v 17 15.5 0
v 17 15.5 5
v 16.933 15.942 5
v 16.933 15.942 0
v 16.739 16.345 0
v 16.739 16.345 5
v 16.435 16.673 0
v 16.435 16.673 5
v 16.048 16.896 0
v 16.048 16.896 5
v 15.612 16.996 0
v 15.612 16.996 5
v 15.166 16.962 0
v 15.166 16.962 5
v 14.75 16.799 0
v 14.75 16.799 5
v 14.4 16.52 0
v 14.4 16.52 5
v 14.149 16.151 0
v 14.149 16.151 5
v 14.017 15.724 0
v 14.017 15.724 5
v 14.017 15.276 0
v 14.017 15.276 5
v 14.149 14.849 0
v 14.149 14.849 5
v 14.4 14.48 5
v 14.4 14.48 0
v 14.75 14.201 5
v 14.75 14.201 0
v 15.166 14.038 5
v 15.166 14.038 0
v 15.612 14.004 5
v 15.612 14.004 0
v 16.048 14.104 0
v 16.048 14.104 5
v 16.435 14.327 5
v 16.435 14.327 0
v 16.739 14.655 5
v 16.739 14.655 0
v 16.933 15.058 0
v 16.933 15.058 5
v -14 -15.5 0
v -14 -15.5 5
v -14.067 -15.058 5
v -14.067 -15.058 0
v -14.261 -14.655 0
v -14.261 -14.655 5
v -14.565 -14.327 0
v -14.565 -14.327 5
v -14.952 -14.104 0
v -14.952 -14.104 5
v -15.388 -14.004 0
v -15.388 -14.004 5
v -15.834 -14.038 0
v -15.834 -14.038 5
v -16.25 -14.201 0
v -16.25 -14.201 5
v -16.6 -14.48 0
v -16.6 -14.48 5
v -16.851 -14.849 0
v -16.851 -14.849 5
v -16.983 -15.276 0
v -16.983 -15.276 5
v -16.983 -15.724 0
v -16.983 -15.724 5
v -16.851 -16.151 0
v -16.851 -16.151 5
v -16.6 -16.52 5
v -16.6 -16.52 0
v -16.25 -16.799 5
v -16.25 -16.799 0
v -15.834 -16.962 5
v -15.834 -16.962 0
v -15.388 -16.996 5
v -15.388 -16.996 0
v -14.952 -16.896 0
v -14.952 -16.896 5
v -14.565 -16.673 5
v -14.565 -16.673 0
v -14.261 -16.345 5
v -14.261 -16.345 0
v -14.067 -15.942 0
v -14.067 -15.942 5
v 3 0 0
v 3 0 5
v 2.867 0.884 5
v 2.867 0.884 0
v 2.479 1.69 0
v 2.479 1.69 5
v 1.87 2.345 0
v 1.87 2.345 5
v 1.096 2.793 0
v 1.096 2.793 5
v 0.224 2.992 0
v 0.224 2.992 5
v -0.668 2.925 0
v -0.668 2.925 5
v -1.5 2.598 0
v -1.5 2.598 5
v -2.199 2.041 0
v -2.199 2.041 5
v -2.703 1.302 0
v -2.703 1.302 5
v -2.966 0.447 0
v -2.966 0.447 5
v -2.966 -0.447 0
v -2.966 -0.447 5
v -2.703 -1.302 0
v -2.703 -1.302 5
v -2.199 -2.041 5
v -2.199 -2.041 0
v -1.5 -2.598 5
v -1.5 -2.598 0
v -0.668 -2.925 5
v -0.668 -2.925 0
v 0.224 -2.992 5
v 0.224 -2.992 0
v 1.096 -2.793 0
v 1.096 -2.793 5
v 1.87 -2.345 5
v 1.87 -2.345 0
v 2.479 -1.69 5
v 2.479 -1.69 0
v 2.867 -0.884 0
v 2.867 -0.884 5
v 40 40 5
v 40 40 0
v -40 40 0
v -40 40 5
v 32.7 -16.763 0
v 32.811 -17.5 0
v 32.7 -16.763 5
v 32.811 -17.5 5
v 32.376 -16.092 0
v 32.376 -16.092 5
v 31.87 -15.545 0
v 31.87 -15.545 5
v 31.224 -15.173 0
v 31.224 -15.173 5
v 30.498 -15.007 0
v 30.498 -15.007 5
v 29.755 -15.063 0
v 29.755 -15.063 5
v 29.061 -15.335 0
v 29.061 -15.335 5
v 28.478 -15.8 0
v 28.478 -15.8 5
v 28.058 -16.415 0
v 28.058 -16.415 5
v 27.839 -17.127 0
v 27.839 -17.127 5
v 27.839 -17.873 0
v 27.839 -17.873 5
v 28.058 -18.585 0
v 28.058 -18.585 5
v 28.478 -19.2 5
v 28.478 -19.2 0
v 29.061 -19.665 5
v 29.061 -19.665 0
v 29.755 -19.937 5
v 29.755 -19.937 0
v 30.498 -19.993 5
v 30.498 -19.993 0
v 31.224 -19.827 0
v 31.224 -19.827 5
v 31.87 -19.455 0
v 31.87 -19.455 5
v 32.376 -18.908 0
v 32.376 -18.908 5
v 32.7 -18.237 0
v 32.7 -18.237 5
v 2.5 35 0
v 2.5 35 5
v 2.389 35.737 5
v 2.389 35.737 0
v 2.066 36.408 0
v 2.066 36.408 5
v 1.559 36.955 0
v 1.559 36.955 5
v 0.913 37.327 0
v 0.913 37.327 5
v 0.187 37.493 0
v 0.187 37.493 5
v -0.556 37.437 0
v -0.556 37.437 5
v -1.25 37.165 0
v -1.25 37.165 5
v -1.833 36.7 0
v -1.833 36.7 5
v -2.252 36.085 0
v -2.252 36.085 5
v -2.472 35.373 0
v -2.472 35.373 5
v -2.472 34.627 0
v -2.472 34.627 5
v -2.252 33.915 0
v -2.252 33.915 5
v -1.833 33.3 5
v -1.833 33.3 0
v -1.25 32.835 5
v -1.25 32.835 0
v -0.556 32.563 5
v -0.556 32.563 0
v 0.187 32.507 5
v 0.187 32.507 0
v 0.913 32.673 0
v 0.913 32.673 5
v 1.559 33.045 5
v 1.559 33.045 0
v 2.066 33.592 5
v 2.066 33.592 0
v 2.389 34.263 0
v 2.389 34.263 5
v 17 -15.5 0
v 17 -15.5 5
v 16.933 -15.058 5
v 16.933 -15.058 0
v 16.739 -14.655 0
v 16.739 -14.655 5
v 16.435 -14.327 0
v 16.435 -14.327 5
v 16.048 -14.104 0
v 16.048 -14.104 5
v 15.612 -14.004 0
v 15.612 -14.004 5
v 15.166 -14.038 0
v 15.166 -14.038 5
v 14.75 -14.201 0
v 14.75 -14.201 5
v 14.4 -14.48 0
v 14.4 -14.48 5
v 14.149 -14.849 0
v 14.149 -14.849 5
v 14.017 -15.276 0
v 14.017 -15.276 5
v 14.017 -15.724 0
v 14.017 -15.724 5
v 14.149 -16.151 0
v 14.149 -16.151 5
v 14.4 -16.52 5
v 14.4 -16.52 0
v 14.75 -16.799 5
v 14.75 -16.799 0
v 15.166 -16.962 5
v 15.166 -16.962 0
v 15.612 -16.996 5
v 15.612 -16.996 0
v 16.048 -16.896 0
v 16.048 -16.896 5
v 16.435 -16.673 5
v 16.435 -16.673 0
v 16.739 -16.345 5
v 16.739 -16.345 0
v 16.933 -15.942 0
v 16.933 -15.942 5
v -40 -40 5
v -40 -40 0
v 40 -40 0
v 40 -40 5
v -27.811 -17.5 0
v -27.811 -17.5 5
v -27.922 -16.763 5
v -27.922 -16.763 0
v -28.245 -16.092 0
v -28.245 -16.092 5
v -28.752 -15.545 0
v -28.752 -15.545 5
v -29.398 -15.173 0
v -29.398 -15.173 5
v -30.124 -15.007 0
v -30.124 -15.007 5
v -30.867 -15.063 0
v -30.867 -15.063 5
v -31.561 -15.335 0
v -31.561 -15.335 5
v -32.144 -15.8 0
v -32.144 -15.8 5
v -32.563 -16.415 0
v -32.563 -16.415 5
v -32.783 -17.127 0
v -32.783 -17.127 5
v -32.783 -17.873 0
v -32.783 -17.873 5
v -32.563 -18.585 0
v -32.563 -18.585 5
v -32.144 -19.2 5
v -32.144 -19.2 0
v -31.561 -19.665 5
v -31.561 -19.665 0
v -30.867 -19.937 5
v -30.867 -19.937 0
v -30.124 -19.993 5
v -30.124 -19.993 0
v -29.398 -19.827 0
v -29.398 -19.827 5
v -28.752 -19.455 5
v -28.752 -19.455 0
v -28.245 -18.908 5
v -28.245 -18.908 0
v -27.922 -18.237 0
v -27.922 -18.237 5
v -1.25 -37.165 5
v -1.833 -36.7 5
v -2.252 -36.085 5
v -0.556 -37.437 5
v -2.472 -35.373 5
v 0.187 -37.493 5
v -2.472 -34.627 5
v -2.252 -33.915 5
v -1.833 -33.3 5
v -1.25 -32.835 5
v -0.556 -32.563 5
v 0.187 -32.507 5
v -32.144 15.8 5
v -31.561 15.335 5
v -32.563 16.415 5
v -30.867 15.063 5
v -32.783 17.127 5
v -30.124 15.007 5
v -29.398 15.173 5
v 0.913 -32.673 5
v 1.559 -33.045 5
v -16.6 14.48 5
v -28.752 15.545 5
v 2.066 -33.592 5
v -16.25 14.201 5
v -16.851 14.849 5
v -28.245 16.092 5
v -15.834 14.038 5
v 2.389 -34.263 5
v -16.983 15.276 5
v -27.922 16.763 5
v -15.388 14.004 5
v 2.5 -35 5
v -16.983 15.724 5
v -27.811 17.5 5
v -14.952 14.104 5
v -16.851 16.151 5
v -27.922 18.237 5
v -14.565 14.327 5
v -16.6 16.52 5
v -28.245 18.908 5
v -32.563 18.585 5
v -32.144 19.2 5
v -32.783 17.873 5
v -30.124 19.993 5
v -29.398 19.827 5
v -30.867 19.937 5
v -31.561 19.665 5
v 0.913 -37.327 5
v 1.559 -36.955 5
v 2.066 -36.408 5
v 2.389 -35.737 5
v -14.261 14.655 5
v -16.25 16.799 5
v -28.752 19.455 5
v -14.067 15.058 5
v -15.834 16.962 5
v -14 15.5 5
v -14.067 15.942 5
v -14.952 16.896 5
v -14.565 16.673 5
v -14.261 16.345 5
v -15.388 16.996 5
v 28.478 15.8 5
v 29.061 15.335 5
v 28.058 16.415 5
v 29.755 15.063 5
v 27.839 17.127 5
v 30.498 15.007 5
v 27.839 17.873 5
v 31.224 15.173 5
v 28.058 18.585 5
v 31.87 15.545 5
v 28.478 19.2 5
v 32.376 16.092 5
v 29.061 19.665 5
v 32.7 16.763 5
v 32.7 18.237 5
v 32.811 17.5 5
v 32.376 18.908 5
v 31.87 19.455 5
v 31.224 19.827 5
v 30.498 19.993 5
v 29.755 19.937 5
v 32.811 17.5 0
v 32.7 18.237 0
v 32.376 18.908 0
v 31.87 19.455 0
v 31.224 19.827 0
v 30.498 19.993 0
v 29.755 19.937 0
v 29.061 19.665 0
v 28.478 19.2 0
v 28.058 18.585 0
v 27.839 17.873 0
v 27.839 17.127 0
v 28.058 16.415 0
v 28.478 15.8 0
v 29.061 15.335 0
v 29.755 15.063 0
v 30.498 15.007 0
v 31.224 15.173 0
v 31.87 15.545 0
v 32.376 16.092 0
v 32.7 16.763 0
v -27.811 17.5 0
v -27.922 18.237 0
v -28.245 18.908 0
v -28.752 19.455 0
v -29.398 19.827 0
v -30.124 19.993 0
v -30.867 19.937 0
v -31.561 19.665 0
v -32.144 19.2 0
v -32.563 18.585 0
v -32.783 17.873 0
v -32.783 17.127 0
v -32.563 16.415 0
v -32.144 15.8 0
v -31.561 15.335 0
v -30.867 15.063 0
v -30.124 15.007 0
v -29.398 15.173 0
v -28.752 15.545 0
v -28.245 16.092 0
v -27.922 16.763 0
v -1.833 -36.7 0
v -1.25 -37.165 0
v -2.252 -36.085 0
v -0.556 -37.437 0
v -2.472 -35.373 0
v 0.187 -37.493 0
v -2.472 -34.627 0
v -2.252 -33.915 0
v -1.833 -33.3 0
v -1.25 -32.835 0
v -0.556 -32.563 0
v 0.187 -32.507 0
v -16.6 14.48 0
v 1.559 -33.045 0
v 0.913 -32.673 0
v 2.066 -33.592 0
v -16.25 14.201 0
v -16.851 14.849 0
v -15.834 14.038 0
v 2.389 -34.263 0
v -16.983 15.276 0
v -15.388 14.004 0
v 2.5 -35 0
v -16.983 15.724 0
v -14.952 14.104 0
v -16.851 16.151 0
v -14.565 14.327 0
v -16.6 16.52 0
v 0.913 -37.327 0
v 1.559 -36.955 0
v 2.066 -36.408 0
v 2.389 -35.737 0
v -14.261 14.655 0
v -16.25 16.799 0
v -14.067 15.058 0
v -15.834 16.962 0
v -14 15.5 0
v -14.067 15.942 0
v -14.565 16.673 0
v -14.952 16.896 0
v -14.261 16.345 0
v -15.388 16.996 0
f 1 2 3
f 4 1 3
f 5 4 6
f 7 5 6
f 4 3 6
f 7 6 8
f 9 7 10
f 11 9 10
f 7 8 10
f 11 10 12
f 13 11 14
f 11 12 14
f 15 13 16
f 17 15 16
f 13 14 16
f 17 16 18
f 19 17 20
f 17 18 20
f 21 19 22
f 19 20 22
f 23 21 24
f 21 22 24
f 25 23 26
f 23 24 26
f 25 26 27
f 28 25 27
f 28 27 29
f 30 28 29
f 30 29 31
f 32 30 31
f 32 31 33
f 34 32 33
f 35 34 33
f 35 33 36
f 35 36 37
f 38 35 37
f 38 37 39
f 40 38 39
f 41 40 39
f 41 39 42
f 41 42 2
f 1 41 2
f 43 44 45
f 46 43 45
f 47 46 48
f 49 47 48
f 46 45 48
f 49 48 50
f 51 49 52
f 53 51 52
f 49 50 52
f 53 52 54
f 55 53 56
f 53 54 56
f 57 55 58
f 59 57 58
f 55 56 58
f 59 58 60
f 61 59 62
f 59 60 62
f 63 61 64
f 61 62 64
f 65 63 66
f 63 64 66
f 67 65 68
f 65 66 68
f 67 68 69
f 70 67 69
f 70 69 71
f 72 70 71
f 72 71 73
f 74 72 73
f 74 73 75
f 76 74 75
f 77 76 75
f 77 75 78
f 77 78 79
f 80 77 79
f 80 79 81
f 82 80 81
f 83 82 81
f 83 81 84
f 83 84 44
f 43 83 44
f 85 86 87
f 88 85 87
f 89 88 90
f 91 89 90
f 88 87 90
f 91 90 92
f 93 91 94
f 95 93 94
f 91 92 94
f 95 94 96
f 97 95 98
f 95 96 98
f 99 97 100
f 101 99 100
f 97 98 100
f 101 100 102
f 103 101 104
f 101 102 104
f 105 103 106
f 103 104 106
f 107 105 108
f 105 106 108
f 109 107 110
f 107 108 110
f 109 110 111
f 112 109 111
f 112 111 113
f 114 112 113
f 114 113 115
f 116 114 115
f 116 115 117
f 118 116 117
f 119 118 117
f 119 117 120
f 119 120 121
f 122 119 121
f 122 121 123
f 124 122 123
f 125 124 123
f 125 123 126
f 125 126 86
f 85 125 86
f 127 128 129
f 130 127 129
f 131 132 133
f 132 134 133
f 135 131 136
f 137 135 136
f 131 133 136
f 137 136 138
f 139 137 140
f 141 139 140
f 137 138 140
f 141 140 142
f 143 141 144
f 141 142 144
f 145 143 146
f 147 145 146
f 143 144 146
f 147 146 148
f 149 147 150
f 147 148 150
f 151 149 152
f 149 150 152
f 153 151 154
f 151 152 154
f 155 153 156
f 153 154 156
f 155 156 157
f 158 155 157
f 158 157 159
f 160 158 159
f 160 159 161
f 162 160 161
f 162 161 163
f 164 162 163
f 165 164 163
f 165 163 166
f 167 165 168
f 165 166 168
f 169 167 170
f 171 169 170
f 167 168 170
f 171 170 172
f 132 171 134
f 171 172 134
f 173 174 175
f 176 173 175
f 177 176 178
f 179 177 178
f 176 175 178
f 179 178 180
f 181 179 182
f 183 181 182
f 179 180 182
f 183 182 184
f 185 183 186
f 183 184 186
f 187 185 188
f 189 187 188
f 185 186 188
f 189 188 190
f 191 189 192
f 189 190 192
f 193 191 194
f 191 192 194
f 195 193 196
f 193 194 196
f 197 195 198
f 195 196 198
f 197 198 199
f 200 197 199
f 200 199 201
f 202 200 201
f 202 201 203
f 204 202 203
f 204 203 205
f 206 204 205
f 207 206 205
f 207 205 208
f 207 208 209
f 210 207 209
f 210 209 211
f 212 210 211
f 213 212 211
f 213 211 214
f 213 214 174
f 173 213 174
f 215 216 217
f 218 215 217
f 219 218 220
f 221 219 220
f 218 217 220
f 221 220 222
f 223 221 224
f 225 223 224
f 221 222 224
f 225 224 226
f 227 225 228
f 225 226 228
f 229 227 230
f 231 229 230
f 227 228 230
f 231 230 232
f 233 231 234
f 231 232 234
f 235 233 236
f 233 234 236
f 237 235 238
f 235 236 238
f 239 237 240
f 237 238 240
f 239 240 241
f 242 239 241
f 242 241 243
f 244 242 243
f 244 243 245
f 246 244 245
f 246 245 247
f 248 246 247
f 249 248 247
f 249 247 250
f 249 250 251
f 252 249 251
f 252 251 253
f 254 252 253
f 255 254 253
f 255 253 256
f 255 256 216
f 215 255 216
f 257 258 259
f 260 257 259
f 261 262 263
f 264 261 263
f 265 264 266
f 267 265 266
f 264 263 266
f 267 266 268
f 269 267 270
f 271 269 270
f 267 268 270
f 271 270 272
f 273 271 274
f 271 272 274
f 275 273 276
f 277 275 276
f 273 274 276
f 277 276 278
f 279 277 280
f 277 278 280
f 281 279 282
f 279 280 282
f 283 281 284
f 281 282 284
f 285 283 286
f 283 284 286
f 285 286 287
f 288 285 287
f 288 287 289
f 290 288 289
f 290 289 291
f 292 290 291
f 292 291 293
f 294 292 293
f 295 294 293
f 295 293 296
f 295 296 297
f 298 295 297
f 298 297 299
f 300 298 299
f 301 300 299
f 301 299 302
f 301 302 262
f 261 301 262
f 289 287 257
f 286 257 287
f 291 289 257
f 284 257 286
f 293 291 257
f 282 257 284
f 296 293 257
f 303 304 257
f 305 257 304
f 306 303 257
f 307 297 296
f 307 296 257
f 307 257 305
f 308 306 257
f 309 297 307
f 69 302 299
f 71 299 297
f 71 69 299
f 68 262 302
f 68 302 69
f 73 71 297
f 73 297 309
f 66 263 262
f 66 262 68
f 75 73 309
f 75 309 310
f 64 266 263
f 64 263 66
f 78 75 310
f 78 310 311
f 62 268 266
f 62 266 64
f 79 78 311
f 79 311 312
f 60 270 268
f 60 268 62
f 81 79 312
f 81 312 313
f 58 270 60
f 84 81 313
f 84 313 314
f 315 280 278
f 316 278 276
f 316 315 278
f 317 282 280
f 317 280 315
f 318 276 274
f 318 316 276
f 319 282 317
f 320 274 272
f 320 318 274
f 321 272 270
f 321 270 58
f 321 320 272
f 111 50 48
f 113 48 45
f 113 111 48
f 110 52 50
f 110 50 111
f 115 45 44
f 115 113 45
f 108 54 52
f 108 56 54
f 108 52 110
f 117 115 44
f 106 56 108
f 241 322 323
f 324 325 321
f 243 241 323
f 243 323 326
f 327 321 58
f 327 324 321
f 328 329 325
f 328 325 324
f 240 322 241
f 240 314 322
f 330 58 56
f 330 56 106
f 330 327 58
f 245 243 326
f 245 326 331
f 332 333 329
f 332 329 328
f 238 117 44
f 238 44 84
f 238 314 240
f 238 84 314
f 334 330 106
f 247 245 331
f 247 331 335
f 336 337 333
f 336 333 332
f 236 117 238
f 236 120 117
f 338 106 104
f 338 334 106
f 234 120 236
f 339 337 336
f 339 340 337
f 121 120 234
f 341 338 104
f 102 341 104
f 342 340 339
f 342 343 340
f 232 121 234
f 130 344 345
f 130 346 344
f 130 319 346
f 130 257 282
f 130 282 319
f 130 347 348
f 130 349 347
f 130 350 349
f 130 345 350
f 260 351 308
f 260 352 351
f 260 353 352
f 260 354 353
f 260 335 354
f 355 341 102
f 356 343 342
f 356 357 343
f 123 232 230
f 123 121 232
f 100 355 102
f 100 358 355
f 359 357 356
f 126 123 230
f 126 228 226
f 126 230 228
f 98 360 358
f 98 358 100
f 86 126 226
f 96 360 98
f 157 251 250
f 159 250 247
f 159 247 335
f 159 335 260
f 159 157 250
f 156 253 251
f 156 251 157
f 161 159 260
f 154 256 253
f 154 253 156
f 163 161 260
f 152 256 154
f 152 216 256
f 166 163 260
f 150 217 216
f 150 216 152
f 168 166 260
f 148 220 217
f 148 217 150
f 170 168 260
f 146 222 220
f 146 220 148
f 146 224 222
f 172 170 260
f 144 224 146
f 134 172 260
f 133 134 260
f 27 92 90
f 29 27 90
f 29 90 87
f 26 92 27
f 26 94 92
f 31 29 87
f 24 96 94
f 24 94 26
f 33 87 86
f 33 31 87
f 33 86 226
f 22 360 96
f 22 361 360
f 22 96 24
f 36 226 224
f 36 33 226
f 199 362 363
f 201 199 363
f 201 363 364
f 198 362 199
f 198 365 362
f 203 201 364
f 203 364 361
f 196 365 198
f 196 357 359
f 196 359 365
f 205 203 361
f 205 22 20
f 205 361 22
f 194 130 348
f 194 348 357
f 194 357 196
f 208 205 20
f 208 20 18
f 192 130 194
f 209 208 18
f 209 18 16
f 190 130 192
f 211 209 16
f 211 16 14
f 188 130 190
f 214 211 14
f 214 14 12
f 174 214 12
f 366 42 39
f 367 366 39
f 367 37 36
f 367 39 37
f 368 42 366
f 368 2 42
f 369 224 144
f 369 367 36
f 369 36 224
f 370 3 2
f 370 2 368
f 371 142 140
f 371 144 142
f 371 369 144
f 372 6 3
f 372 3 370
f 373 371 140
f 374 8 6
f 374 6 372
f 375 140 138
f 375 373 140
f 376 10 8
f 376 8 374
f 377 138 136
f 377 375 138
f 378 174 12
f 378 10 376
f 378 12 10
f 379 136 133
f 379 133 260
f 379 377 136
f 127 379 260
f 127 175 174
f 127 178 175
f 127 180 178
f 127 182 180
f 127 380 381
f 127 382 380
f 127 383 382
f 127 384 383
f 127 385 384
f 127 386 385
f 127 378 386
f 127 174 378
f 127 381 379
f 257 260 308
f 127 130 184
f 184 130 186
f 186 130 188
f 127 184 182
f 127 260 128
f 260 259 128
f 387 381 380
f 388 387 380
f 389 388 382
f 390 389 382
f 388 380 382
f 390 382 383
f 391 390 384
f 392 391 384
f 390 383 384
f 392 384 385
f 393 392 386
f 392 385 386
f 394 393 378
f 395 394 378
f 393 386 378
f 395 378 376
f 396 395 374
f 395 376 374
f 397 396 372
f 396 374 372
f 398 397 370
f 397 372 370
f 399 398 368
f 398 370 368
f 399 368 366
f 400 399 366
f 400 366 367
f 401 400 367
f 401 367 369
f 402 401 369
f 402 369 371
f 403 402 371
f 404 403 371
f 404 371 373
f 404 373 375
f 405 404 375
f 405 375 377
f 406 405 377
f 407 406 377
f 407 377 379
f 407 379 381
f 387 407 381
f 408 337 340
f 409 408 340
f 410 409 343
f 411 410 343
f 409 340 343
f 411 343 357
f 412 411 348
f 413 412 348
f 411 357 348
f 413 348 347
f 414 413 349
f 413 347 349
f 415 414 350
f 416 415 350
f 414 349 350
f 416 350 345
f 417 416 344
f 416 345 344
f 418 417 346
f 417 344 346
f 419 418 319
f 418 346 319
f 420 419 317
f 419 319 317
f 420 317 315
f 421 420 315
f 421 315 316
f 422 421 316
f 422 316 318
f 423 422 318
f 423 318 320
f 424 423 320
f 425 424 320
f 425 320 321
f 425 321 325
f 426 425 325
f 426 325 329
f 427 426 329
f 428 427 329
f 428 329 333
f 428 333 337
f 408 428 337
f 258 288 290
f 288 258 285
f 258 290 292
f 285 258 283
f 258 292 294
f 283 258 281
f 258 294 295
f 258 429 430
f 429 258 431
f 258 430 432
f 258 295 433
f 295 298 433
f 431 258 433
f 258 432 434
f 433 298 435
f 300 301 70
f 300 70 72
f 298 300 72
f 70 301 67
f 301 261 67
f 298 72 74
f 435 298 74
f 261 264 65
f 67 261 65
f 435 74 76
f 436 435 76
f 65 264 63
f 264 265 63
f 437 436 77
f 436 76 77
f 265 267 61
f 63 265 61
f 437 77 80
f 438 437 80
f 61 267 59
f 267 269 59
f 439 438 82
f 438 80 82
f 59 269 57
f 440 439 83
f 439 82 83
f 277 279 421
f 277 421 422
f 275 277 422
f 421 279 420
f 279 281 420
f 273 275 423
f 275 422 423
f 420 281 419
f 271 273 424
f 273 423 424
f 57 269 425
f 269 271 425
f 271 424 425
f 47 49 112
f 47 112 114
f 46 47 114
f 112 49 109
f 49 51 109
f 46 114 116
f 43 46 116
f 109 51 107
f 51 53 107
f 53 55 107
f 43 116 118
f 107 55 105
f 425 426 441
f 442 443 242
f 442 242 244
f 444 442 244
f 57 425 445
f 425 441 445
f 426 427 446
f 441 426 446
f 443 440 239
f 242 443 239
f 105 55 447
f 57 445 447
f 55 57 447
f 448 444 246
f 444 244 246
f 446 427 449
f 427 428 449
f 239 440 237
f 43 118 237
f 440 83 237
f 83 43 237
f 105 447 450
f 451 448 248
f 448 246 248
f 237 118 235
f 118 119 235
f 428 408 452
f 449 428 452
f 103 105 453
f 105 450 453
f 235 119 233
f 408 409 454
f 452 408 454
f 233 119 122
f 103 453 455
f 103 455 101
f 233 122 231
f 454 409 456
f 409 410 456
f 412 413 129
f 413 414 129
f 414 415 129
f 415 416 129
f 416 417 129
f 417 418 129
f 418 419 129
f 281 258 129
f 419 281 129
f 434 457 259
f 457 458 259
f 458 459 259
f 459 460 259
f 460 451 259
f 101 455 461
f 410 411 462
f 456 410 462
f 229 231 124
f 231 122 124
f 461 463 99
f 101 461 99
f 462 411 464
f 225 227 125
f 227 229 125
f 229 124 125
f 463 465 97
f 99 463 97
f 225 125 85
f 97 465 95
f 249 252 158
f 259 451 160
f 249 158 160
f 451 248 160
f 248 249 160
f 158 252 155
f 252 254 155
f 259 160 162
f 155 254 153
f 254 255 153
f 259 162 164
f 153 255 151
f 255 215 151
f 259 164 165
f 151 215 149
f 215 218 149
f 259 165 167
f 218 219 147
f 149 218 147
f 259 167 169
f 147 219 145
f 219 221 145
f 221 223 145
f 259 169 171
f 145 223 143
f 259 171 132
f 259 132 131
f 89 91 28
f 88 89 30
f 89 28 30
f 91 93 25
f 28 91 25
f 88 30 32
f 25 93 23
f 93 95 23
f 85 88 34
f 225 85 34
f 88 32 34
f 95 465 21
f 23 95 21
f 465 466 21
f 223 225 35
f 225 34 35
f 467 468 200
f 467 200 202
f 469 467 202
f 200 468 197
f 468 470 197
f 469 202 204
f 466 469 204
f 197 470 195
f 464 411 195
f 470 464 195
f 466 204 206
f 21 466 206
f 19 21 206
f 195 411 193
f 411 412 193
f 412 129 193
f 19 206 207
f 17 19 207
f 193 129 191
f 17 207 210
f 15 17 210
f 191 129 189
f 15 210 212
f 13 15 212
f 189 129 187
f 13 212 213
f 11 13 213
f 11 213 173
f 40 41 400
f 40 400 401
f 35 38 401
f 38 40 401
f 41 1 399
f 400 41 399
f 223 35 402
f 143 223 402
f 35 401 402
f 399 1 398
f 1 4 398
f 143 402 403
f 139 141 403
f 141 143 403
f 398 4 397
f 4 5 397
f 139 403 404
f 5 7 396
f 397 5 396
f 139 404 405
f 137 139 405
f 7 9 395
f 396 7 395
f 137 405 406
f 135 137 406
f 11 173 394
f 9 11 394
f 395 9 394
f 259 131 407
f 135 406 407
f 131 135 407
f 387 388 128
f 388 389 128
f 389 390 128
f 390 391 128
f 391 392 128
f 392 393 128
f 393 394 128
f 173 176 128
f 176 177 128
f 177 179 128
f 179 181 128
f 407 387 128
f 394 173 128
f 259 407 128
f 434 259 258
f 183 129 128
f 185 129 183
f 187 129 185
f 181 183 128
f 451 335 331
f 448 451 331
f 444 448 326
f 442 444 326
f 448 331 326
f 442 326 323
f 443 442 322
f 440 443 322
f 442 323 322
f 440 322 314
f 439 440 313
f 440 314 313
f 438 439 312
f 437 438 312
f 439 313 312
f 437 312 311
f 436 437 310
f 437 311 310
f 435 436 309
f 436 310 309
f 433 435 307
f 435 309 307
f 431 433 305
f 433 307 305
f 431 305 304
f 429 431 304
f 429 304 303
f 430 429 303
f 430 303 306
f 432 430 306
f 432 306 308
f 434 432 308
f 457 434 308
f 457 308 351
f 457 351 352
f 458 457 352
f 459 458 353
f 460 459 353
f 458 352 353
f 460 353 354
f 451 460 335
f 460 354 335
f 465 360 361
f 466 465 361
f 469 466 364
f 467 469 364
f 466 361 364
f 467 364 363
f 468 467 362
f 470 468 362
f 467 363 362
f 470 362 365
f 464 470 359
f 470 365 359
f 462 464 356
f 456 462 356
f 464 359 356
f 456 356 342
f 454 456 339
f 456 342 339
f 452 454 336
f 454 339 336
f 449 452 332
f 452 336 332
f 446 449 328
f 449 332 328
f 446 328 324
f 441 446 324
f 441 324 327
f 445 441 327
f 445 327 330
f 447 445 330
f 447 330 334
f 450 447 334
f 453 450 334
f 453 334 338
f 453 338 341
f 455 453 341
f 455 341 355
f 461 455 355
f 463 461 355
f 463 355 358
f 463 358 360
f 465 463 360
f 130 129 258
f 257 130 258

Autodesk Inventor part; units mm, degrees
ref_plane "YZ Plane" through (0, 0, 0) normal (1, 0, 0) x (0, 1, 0)
ref_plane "XZ Plane" through (0, 0, 0) normal (0, 1, 0) x (-1, 0, 0)
ref_plane "XY Plane" through (0, 0, 0) normal (0, 0, 1) x (1, 0, 0)
sketch "Sketch1" plane through (0, 0, 0) normal (0, 0, 1) x (1, 0, 0)
  line L0 (-40, -40) -> (40, -40)
  line L1 (40, -40) -> (40, 40)
  line L2 (40, 40) -> (-40, 40)
  line L3 (-40, 40) -> (-40, -40)
  line L4 (-40, -40) -> (40, 40) construction
  line L5 (40, -40) -> (-40, 40) construction
  point P0 (0, 0)
  dimension "d0" = 80
  dimension "d1" = 80
extrude "Extrusion1" add sketch "Sketch1" along normal blind 5
sketch "Sketch2" plane through (0, 0, 5) normal (0, 0, 1) x (1, 0, 0)
  circle A0 centre (0, 0) radius 3
  circle A1 centre (0, 35) radius 2.5
  circle A2 centre (-30.3109, 17.5) radius 2.5
  circle A3 centre (-30.3109, -17.5) radius 2.5
  circle A4 centre (0, -35) radius 2.5
  circle A5 centre (30.3109, -17.5) radius 2.5
  circle A6 centre (30.3109, 17.5) radius 2.5
  line L0 (-15.5, -15.5) -> (15.5, -15.5) construction
  line L1 (15.5, -15.5) -> (15.5, 15.5) construction
  line L2 (15.5, 15.5) -> (-15.5, 15.5) construction
  line L3 (-15.5, 15.5) -> (-15.5, -15.5) construction
  line L4 (-15.5, -15.5) -> (15.5, 15.5) construction
  line L5 (15.5, -15.5) -> (-15.5, 15.5) construction
  circle A7 centre (-15.5, 15.5) radius 1.5
  circle A8 centre (15.5, 15.5) radius 1.5
  circle A9 centre (15.5, -15.5) radius 1.5
  circle A10 centre (-15.5, -15.5) radius 1.5
  dimension "d4" = 6
  dimension "d5" = 5
  dimension "d6" = 35
  dimension "d9" = 360
  dimension "d11" = 31
  dimension "d12" = 31
  dimension "d13" = 3
  dimension "d14" = 3
  dimension "d15" = 3
  dimension "d16" = 3
extrude "Extrusion2" cut sketch "Sketch2" against normal through all
properties part number "HA003" material "ABS Plastic"
